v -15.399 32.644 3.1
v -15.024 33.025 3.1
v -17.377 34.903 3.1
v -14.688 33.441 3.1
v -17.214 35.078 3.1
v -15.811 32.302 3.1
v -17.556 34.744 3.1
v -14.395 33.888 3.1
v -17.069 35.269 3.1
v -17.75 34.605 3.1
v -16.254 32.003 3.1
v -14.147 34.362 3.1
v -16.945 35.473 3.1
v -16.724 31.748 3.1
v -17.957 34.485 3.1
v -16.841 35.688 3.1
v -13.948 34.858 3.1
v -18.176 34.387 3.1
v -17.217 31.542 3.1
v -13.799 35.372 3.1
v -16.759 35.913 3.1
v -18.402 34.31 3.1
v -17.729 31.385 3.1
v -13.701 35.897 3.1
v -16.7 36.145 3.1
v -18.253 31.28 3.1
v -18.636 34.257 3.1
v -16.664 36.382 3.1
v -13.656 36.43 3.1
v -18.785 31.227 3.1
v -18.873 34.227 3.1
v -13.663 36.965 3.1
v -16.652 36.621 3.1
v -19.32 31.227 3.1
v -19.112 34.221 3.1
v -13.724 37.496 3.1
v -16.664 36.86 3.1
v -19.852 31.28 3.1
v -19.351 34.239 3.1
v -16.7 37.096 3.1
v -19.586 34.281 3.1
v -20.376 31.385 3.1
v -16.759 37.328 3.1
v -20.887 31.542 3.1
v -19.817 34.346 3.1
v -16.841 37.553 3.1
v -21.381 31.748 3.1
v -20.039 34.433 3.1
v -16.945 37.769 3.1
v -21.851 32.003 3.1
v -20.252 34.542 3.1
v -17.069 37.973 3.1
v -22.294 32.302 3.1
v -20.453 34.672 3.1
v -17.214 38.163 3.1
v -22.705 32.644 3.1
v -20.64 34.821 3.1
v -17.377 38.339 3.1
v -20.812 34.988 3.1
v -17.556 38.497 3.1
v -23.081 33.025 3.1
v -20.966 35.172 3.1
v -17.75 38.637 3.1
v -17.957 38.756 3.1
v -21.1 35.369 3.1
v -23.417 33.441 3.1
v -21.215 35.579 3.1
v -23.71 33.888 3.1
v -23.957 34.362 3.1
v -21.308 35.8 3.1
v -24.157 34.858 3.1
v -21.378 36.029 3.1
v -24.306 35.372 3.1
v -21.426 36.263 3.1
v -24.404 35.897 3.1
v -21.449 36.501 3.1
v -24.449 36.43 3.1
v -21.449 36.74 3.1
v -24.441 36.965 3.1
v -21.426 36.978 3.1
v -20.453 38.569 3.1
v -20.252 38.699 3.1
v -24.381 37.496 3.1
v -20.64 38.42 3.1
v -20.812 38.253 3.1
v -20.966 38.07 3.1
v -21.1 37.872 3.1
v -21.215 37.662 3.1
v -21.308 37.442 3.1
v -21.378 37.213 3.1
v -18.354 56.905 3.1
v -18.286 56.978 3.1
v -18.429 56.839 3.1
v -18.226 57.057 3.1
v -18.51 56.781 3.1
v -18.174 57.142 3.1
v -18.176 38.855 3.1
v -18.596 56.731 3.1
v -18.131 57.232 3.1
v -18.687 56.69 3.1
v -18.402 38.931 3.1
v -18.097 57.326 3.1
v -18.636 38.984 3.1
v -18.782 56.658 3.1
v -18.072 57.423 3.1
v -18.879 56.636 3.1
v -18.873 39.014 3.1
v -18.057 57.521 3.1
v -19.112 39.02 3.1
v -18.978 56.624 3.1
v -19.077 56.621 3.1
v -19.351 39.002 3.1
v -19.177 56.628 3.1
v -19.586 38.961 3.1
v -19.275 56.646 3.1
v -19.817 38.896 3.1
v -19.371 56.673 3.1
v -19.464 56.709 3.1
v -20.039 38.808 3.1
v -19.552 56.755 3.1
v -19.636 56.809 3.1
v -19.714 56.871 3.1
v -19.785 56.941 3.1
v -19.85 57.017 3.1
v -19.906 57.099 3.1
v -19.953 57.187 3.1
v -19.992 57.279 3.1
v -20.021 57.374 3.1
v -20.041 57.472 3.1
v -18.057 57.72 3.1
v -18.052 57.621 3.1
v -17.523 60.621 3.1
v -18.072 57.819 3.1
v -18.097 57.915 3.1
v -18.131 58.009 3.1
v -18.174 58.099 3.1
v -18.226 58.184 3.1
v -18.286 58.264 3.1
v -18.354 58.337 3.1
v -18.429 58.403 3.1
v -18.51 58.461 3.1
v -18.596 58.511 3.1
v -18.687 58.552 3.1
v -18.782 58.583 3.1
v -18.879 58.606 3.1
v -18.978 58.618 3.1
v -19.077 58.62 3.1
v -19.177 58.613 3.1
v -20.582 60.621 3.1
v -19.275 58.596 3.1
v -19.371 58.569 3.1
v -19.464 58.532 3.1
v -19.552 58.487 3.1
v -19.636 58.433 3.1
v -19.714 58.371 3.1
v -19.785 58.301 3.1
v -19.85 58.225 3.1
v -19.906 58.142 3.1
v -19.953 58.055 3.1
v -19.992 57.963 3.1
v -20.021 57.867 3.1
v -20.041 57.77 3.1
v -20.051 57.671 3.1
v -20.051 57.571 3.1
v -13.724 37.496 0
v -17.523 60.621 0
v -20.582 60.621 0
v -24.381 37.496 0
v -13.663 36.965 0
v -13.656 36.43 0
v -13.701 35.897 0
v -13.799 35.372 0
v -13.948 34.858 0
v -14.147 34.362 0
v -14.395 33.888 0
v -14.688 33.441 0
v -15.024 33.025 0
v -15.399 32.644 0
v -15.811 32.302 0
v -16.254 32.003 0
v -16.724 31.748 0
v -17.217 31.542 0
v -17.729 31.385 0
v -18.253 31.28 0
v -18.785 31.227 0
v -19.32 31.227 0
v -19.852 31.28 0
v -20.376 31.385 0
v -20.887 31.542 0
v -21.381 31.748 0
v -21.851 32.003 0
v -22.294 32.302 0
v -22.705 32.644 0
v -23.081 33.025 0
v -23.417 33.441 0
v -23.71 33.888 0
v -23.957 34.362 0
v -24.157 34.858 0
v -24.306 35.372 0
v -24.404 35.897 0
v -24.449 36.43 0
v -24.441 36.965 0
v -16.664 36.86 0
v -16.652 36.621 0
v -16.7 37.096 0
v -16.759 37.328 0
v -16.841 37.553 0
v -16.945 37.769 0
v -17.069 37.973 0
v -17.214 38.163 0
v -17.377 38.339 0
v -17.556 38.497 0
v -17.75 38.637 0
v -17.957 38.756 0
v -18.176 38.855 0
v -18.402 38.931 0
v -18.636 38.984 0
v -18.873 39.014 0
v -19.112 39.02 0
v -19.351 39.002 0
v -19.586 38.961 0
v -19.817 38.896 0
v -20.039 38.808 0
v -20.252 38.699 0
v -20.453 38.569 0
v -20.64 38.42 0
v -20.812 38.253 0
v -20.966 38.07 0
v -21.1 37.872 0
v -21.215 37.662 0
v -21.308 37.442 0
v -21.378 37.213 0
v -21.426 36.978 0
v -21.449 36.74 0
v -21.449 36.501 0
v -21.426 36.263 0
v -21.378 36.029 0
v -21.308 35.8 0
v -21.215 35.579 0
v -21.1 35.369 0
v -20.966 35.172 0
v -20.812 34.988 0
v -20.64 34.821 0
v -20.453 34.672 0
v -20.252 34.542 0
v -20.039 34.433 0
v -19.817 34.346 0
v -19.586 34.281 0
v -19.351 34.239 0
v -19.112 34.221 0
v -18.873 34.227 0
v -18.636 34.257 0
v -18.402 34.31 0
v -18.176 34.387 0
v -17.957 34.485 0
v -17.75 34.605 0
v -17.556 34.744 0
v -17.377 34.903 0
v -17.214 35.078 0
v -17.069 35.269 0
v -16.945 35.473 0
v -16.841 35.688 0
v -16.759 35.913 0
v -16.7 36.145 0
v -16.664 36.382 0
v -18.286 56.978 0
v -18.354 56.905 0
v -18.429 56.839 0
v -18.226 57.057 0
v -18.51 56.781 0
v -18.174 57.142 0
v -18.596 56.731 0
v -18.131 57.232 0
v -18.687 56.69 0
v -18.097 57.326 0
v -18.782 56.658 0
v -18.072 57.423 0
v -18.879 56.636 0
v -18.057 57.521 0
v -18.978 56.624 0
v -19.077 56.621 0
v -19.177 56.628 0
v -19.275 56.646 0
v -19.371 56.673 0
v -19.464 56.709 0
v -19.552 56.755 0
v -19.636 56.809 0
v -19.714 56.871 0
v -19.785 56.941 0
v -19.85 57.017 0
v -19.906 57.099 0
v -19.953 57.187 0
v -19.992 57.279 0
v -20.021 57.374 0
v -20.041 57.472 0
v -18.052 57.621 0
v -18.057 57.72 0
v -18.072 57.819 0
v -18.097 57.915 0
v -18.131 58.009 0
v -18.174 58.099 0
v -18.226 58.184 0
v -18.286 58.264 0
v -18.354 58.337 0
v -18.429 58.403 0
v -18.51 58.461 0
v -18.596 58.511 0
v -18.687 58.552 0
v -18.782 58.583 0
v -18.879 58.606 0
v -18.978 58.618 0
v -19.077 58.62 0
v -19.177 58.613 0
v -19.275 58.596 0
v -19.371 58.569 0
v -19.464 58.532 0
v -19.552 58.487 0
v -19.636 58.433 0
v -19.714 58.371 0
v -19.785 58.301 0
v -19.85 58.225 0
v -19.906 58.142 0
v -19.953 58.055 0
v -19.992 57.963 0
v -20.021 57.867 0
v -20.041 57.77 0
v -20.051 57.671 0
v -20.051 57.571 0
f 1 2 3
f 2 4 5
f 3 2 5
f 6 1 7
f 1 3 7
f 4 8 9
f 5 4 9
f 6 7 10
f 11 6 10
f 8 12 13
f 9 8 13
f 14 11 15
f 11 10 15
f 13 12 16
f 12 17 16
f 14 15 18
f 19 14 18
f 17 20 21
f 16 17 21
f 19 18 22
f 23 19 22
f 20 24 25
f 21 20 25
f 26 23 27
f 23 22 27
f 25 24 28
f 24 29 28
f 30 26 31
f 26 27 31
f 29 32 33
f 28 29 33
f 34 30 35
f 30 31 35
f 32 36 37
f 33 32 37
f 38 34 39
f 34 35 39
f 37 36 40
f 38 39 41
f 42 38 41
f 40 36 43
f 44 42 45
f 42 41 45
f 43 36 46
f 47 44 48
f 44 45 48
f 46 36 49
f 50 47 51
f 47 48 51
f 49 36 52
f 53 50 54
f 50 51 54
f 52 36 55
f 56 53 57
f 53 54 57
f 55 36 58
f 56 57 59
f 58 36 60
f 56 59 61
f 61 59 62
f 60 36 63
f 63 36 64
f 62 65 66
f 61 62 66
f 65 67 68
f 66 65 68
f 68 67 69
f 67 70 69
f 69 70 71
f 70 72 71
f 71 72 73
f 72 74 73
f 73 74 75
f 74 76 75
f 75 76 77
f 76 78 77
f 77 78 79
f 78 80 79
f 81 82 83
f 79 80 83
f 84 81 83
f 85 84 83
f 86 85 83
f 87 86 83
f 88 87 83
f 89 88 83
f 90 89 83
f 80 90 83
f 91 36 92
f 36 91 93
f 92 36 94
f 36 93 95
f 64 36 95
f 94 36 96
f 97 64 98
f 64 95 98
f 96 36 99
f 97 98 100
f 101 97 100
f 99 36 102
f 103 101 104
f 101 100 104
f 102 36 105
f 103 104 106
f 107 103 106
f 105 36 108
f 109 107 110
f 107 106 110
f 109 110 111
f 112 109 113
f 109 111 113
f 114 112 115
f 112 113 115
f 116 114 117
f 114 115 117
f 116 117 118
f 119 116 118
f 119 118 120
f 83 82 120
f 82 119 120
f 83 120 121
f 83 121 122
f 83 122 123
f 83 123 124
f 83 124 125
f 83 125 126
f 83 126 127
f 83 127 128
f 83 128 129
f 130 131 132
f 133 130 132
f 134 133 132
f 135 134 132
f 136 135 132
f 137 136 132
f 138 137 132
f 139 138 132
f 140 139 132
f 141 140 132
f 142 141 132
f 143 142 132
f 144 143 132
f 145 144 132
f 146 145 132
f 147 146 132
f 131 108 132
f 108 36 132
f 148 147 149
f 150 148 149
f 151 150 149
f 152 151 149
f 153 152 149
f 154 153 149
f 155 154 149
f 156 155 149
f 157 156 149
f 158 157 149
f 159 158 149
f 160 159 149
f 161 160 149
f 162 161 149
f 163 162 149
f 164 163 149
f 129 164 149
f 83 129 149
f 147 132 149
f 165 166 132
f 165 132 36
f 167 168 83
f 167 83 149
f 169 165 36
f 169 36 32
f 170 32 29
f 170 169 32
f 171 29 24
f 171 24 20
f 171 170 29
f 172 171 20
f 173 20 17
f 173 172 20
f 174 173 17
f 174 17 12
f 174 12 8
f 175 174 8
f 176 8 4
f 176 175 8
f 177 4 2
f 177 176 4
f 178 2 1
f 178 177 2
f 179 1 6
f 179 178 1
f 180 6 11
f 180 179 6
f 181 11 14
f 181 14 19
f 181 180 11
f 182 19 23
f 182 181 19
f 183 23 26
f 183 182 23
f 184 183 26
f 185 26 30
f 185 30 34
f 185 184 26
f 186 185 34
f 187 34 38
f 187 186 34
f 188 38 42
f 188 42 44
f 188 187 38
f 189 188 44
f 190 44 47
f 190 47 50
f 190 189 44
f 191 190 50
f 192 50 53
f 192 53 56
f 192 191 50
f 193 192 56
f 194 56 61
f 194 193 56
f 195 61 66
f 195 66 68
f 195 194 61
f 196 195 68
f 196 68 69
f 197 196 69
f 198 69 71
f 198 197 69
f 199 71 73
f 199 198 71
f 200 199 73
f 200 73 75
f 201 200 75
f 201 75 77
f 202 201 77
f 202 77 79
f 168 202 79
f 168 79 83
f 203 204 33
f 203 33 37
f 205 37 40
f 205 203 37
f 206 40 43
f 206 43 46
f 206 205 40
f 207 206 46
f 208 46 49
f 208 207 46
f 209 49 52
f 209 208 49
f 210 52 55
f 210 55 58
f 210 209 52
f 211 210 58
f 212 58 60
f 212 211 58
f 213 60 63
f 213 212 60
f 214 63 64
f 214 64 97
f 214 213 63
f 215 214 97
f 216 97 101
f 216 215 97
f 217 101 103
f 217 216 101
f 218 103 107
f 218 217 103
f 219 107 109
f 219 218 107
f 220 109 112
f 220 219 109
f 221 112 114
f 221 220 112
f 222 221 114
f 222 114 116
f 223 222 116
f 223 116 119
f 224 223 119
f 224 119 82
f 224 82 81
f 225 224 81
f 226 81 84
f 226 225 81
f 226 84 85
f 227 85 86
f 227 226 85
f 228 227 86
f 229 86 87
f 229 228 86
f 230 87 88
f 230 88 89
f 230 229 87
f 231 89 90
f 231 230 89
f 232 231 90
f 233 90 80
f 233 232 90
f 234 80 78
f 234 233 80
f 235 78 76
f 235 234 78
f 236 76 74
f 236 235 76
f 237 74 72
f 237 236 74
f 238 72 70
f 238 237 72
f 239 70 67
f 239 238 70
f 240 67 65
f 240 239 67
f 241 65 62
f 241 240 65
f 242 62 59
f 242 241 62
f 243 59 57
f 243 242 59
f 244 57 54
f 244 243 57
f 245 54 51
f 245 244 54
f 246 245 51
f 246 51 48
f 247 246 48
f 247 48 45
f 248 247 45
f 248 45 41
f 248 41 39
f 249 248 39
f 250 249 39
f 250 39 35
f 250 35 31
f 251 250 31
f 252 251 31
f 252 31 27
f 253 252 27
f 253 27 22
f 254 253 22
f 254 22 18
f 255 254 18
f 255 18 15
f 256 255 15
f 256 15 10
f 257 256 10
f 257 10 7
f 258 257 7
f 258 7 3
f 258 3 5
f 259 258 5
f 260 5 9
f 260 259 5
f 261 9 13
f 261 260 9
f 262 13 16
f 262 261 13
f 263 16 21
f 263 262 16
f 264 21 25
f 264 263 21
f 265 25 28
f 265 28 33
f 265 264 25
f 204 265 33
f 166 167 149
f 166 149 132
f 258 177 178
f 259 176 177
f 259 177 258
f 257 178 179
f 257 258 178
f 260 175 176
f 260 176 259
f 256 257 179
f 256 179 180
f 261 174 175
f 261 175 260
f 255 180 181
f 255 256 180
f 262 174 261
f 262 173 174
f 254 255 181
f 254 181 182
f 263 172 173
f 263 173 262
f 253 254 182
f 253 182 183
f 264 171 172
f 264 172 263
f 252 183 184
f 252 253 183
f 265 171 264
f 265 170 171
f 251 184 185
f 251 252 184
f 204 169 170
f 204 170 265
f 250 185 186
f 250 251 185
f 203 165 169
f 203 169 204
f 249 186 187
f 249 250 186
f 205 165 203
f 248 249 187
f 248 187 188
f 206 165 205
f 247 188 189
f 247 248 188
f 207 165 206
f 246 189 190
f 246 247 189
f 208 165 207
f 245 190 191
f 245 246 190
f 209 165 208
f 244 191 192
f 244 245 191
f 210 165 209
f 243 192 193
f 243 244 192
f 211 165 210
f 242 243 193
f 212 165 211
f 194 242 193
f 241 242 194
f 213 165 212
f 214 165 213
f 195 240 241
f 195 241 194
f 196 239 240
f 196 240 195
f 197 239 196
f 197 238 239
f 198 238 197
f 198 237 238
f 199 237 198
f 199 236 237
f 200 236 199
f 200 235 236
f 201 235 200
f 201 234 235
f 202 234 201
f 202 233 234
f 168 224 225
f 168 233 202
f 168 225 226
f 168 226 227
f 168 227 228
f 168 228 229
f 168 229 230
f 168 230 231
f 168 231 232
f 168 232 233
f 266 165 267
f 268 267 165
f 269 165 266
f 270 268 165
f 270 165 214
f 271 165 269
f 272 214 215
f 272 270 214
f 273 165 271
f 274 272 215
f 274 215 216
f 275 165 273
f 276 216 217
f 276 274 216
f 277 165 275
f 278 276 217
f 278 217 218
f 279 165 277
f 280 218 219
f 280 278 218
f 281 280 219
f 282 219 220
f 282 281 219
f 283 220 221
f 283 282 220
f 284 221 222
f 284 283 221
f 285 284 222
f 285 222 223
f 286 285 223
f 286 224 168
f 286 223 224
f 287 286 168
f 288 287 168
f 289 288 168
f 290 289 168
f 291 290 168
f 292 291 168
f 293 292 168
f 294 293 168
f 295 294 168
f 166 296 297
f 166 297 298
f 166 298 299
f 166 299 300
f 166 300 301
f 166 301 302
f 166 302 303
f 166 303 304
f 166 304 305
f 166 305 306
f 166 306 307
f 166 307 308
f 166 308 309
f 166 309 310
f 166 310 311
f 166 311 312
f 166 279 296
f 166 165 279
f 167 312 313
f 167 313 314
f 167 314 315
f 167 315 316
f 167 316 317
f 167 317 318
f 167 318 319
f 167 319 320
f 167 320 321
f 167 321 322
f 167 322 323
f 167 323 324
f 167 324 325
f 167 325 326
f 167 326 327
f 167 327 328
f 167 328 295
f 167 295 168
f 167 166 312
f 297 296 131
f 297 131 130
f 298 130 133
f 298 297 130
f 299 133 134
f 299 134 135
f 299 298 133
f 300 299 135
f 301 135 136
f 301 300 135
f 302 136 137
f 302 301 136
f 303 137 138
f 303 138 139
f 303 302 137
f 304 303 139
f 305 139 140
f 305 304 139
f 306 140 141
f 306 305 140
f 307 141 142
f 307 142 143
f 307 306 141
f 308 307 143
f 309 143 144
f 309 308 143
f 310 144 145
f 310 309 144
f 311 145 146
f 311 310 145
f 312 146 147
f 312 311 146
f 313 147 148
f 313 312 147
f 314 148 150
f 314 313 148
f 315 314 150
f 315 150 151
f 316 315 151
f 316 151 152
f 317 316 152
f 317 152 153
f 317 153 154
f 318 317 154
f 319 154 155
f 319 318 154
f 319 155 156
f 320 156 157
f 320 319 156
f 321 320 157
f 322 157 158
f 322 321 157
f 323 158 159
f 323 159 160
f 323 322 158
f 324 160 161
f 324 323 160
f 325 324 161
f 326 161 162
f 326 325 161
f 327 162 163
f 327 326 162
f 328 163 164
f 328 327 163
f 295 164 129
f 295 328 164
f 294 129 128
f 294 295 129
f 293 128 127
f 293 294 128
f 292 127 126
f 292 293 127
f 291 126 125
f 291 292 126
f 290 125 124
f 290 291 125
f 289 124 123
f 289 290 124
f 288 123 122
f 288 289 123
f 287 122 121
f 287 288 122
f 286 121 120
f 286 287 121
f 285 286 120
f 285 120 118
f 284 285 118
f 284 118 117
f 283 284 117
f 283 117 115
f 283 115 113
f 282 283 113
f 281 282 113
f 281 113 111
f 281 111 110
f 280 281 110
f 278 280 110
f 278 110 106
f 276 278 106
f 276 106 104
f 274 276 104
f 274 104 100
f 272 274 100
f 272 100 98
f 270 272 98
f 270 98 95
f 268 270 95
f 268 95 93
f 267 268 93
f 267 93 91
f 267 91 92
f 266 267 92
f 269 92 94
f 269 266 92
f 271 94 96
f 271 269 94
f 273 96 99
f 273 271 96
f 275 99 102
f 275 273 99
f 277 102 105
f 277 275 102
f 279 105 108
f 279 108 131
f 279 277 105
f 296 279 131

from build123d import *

# Parameters (mm, degrees)
SKETCH1_R           = 2.4
SKETCH1_R_2         = 1
BOSS_EXTRUDE1_DEPTH = 3.1


with BuildPart() as part:
    # Sketch1 → Boss-Extrude1 (new body)
    with BuildSketch(Plane.XY):
        with BuildLine():
            Line((-20.581998731, 60.620734864), (-17.522774409, 60.620734864))
            Line((-17.522774409, 60.620734864), (-13.723813298, 37.496124427))
            ThreePointArc((-13.723813298, 37.496124427), (-19.05238657, 31.220734864), (-24.380959842, 37.496124427))
            Line((-24.380959842, 37.496124427), (-20.581998731, 60.620734864))
        make_face()
        with Locations((-19.05238657, 36.620734864)):
            Circle(SKETCH1_R, mode=Mode.SUBTRACT)
        with Locations((-19.05238657, 57.620734864)):
            Circle(SKETCH1_R_2, mode=Mode.SUBTRACT)
    extrude(amount=BOSS_EXTRUDE1_DEPTH)


solid = part.part
